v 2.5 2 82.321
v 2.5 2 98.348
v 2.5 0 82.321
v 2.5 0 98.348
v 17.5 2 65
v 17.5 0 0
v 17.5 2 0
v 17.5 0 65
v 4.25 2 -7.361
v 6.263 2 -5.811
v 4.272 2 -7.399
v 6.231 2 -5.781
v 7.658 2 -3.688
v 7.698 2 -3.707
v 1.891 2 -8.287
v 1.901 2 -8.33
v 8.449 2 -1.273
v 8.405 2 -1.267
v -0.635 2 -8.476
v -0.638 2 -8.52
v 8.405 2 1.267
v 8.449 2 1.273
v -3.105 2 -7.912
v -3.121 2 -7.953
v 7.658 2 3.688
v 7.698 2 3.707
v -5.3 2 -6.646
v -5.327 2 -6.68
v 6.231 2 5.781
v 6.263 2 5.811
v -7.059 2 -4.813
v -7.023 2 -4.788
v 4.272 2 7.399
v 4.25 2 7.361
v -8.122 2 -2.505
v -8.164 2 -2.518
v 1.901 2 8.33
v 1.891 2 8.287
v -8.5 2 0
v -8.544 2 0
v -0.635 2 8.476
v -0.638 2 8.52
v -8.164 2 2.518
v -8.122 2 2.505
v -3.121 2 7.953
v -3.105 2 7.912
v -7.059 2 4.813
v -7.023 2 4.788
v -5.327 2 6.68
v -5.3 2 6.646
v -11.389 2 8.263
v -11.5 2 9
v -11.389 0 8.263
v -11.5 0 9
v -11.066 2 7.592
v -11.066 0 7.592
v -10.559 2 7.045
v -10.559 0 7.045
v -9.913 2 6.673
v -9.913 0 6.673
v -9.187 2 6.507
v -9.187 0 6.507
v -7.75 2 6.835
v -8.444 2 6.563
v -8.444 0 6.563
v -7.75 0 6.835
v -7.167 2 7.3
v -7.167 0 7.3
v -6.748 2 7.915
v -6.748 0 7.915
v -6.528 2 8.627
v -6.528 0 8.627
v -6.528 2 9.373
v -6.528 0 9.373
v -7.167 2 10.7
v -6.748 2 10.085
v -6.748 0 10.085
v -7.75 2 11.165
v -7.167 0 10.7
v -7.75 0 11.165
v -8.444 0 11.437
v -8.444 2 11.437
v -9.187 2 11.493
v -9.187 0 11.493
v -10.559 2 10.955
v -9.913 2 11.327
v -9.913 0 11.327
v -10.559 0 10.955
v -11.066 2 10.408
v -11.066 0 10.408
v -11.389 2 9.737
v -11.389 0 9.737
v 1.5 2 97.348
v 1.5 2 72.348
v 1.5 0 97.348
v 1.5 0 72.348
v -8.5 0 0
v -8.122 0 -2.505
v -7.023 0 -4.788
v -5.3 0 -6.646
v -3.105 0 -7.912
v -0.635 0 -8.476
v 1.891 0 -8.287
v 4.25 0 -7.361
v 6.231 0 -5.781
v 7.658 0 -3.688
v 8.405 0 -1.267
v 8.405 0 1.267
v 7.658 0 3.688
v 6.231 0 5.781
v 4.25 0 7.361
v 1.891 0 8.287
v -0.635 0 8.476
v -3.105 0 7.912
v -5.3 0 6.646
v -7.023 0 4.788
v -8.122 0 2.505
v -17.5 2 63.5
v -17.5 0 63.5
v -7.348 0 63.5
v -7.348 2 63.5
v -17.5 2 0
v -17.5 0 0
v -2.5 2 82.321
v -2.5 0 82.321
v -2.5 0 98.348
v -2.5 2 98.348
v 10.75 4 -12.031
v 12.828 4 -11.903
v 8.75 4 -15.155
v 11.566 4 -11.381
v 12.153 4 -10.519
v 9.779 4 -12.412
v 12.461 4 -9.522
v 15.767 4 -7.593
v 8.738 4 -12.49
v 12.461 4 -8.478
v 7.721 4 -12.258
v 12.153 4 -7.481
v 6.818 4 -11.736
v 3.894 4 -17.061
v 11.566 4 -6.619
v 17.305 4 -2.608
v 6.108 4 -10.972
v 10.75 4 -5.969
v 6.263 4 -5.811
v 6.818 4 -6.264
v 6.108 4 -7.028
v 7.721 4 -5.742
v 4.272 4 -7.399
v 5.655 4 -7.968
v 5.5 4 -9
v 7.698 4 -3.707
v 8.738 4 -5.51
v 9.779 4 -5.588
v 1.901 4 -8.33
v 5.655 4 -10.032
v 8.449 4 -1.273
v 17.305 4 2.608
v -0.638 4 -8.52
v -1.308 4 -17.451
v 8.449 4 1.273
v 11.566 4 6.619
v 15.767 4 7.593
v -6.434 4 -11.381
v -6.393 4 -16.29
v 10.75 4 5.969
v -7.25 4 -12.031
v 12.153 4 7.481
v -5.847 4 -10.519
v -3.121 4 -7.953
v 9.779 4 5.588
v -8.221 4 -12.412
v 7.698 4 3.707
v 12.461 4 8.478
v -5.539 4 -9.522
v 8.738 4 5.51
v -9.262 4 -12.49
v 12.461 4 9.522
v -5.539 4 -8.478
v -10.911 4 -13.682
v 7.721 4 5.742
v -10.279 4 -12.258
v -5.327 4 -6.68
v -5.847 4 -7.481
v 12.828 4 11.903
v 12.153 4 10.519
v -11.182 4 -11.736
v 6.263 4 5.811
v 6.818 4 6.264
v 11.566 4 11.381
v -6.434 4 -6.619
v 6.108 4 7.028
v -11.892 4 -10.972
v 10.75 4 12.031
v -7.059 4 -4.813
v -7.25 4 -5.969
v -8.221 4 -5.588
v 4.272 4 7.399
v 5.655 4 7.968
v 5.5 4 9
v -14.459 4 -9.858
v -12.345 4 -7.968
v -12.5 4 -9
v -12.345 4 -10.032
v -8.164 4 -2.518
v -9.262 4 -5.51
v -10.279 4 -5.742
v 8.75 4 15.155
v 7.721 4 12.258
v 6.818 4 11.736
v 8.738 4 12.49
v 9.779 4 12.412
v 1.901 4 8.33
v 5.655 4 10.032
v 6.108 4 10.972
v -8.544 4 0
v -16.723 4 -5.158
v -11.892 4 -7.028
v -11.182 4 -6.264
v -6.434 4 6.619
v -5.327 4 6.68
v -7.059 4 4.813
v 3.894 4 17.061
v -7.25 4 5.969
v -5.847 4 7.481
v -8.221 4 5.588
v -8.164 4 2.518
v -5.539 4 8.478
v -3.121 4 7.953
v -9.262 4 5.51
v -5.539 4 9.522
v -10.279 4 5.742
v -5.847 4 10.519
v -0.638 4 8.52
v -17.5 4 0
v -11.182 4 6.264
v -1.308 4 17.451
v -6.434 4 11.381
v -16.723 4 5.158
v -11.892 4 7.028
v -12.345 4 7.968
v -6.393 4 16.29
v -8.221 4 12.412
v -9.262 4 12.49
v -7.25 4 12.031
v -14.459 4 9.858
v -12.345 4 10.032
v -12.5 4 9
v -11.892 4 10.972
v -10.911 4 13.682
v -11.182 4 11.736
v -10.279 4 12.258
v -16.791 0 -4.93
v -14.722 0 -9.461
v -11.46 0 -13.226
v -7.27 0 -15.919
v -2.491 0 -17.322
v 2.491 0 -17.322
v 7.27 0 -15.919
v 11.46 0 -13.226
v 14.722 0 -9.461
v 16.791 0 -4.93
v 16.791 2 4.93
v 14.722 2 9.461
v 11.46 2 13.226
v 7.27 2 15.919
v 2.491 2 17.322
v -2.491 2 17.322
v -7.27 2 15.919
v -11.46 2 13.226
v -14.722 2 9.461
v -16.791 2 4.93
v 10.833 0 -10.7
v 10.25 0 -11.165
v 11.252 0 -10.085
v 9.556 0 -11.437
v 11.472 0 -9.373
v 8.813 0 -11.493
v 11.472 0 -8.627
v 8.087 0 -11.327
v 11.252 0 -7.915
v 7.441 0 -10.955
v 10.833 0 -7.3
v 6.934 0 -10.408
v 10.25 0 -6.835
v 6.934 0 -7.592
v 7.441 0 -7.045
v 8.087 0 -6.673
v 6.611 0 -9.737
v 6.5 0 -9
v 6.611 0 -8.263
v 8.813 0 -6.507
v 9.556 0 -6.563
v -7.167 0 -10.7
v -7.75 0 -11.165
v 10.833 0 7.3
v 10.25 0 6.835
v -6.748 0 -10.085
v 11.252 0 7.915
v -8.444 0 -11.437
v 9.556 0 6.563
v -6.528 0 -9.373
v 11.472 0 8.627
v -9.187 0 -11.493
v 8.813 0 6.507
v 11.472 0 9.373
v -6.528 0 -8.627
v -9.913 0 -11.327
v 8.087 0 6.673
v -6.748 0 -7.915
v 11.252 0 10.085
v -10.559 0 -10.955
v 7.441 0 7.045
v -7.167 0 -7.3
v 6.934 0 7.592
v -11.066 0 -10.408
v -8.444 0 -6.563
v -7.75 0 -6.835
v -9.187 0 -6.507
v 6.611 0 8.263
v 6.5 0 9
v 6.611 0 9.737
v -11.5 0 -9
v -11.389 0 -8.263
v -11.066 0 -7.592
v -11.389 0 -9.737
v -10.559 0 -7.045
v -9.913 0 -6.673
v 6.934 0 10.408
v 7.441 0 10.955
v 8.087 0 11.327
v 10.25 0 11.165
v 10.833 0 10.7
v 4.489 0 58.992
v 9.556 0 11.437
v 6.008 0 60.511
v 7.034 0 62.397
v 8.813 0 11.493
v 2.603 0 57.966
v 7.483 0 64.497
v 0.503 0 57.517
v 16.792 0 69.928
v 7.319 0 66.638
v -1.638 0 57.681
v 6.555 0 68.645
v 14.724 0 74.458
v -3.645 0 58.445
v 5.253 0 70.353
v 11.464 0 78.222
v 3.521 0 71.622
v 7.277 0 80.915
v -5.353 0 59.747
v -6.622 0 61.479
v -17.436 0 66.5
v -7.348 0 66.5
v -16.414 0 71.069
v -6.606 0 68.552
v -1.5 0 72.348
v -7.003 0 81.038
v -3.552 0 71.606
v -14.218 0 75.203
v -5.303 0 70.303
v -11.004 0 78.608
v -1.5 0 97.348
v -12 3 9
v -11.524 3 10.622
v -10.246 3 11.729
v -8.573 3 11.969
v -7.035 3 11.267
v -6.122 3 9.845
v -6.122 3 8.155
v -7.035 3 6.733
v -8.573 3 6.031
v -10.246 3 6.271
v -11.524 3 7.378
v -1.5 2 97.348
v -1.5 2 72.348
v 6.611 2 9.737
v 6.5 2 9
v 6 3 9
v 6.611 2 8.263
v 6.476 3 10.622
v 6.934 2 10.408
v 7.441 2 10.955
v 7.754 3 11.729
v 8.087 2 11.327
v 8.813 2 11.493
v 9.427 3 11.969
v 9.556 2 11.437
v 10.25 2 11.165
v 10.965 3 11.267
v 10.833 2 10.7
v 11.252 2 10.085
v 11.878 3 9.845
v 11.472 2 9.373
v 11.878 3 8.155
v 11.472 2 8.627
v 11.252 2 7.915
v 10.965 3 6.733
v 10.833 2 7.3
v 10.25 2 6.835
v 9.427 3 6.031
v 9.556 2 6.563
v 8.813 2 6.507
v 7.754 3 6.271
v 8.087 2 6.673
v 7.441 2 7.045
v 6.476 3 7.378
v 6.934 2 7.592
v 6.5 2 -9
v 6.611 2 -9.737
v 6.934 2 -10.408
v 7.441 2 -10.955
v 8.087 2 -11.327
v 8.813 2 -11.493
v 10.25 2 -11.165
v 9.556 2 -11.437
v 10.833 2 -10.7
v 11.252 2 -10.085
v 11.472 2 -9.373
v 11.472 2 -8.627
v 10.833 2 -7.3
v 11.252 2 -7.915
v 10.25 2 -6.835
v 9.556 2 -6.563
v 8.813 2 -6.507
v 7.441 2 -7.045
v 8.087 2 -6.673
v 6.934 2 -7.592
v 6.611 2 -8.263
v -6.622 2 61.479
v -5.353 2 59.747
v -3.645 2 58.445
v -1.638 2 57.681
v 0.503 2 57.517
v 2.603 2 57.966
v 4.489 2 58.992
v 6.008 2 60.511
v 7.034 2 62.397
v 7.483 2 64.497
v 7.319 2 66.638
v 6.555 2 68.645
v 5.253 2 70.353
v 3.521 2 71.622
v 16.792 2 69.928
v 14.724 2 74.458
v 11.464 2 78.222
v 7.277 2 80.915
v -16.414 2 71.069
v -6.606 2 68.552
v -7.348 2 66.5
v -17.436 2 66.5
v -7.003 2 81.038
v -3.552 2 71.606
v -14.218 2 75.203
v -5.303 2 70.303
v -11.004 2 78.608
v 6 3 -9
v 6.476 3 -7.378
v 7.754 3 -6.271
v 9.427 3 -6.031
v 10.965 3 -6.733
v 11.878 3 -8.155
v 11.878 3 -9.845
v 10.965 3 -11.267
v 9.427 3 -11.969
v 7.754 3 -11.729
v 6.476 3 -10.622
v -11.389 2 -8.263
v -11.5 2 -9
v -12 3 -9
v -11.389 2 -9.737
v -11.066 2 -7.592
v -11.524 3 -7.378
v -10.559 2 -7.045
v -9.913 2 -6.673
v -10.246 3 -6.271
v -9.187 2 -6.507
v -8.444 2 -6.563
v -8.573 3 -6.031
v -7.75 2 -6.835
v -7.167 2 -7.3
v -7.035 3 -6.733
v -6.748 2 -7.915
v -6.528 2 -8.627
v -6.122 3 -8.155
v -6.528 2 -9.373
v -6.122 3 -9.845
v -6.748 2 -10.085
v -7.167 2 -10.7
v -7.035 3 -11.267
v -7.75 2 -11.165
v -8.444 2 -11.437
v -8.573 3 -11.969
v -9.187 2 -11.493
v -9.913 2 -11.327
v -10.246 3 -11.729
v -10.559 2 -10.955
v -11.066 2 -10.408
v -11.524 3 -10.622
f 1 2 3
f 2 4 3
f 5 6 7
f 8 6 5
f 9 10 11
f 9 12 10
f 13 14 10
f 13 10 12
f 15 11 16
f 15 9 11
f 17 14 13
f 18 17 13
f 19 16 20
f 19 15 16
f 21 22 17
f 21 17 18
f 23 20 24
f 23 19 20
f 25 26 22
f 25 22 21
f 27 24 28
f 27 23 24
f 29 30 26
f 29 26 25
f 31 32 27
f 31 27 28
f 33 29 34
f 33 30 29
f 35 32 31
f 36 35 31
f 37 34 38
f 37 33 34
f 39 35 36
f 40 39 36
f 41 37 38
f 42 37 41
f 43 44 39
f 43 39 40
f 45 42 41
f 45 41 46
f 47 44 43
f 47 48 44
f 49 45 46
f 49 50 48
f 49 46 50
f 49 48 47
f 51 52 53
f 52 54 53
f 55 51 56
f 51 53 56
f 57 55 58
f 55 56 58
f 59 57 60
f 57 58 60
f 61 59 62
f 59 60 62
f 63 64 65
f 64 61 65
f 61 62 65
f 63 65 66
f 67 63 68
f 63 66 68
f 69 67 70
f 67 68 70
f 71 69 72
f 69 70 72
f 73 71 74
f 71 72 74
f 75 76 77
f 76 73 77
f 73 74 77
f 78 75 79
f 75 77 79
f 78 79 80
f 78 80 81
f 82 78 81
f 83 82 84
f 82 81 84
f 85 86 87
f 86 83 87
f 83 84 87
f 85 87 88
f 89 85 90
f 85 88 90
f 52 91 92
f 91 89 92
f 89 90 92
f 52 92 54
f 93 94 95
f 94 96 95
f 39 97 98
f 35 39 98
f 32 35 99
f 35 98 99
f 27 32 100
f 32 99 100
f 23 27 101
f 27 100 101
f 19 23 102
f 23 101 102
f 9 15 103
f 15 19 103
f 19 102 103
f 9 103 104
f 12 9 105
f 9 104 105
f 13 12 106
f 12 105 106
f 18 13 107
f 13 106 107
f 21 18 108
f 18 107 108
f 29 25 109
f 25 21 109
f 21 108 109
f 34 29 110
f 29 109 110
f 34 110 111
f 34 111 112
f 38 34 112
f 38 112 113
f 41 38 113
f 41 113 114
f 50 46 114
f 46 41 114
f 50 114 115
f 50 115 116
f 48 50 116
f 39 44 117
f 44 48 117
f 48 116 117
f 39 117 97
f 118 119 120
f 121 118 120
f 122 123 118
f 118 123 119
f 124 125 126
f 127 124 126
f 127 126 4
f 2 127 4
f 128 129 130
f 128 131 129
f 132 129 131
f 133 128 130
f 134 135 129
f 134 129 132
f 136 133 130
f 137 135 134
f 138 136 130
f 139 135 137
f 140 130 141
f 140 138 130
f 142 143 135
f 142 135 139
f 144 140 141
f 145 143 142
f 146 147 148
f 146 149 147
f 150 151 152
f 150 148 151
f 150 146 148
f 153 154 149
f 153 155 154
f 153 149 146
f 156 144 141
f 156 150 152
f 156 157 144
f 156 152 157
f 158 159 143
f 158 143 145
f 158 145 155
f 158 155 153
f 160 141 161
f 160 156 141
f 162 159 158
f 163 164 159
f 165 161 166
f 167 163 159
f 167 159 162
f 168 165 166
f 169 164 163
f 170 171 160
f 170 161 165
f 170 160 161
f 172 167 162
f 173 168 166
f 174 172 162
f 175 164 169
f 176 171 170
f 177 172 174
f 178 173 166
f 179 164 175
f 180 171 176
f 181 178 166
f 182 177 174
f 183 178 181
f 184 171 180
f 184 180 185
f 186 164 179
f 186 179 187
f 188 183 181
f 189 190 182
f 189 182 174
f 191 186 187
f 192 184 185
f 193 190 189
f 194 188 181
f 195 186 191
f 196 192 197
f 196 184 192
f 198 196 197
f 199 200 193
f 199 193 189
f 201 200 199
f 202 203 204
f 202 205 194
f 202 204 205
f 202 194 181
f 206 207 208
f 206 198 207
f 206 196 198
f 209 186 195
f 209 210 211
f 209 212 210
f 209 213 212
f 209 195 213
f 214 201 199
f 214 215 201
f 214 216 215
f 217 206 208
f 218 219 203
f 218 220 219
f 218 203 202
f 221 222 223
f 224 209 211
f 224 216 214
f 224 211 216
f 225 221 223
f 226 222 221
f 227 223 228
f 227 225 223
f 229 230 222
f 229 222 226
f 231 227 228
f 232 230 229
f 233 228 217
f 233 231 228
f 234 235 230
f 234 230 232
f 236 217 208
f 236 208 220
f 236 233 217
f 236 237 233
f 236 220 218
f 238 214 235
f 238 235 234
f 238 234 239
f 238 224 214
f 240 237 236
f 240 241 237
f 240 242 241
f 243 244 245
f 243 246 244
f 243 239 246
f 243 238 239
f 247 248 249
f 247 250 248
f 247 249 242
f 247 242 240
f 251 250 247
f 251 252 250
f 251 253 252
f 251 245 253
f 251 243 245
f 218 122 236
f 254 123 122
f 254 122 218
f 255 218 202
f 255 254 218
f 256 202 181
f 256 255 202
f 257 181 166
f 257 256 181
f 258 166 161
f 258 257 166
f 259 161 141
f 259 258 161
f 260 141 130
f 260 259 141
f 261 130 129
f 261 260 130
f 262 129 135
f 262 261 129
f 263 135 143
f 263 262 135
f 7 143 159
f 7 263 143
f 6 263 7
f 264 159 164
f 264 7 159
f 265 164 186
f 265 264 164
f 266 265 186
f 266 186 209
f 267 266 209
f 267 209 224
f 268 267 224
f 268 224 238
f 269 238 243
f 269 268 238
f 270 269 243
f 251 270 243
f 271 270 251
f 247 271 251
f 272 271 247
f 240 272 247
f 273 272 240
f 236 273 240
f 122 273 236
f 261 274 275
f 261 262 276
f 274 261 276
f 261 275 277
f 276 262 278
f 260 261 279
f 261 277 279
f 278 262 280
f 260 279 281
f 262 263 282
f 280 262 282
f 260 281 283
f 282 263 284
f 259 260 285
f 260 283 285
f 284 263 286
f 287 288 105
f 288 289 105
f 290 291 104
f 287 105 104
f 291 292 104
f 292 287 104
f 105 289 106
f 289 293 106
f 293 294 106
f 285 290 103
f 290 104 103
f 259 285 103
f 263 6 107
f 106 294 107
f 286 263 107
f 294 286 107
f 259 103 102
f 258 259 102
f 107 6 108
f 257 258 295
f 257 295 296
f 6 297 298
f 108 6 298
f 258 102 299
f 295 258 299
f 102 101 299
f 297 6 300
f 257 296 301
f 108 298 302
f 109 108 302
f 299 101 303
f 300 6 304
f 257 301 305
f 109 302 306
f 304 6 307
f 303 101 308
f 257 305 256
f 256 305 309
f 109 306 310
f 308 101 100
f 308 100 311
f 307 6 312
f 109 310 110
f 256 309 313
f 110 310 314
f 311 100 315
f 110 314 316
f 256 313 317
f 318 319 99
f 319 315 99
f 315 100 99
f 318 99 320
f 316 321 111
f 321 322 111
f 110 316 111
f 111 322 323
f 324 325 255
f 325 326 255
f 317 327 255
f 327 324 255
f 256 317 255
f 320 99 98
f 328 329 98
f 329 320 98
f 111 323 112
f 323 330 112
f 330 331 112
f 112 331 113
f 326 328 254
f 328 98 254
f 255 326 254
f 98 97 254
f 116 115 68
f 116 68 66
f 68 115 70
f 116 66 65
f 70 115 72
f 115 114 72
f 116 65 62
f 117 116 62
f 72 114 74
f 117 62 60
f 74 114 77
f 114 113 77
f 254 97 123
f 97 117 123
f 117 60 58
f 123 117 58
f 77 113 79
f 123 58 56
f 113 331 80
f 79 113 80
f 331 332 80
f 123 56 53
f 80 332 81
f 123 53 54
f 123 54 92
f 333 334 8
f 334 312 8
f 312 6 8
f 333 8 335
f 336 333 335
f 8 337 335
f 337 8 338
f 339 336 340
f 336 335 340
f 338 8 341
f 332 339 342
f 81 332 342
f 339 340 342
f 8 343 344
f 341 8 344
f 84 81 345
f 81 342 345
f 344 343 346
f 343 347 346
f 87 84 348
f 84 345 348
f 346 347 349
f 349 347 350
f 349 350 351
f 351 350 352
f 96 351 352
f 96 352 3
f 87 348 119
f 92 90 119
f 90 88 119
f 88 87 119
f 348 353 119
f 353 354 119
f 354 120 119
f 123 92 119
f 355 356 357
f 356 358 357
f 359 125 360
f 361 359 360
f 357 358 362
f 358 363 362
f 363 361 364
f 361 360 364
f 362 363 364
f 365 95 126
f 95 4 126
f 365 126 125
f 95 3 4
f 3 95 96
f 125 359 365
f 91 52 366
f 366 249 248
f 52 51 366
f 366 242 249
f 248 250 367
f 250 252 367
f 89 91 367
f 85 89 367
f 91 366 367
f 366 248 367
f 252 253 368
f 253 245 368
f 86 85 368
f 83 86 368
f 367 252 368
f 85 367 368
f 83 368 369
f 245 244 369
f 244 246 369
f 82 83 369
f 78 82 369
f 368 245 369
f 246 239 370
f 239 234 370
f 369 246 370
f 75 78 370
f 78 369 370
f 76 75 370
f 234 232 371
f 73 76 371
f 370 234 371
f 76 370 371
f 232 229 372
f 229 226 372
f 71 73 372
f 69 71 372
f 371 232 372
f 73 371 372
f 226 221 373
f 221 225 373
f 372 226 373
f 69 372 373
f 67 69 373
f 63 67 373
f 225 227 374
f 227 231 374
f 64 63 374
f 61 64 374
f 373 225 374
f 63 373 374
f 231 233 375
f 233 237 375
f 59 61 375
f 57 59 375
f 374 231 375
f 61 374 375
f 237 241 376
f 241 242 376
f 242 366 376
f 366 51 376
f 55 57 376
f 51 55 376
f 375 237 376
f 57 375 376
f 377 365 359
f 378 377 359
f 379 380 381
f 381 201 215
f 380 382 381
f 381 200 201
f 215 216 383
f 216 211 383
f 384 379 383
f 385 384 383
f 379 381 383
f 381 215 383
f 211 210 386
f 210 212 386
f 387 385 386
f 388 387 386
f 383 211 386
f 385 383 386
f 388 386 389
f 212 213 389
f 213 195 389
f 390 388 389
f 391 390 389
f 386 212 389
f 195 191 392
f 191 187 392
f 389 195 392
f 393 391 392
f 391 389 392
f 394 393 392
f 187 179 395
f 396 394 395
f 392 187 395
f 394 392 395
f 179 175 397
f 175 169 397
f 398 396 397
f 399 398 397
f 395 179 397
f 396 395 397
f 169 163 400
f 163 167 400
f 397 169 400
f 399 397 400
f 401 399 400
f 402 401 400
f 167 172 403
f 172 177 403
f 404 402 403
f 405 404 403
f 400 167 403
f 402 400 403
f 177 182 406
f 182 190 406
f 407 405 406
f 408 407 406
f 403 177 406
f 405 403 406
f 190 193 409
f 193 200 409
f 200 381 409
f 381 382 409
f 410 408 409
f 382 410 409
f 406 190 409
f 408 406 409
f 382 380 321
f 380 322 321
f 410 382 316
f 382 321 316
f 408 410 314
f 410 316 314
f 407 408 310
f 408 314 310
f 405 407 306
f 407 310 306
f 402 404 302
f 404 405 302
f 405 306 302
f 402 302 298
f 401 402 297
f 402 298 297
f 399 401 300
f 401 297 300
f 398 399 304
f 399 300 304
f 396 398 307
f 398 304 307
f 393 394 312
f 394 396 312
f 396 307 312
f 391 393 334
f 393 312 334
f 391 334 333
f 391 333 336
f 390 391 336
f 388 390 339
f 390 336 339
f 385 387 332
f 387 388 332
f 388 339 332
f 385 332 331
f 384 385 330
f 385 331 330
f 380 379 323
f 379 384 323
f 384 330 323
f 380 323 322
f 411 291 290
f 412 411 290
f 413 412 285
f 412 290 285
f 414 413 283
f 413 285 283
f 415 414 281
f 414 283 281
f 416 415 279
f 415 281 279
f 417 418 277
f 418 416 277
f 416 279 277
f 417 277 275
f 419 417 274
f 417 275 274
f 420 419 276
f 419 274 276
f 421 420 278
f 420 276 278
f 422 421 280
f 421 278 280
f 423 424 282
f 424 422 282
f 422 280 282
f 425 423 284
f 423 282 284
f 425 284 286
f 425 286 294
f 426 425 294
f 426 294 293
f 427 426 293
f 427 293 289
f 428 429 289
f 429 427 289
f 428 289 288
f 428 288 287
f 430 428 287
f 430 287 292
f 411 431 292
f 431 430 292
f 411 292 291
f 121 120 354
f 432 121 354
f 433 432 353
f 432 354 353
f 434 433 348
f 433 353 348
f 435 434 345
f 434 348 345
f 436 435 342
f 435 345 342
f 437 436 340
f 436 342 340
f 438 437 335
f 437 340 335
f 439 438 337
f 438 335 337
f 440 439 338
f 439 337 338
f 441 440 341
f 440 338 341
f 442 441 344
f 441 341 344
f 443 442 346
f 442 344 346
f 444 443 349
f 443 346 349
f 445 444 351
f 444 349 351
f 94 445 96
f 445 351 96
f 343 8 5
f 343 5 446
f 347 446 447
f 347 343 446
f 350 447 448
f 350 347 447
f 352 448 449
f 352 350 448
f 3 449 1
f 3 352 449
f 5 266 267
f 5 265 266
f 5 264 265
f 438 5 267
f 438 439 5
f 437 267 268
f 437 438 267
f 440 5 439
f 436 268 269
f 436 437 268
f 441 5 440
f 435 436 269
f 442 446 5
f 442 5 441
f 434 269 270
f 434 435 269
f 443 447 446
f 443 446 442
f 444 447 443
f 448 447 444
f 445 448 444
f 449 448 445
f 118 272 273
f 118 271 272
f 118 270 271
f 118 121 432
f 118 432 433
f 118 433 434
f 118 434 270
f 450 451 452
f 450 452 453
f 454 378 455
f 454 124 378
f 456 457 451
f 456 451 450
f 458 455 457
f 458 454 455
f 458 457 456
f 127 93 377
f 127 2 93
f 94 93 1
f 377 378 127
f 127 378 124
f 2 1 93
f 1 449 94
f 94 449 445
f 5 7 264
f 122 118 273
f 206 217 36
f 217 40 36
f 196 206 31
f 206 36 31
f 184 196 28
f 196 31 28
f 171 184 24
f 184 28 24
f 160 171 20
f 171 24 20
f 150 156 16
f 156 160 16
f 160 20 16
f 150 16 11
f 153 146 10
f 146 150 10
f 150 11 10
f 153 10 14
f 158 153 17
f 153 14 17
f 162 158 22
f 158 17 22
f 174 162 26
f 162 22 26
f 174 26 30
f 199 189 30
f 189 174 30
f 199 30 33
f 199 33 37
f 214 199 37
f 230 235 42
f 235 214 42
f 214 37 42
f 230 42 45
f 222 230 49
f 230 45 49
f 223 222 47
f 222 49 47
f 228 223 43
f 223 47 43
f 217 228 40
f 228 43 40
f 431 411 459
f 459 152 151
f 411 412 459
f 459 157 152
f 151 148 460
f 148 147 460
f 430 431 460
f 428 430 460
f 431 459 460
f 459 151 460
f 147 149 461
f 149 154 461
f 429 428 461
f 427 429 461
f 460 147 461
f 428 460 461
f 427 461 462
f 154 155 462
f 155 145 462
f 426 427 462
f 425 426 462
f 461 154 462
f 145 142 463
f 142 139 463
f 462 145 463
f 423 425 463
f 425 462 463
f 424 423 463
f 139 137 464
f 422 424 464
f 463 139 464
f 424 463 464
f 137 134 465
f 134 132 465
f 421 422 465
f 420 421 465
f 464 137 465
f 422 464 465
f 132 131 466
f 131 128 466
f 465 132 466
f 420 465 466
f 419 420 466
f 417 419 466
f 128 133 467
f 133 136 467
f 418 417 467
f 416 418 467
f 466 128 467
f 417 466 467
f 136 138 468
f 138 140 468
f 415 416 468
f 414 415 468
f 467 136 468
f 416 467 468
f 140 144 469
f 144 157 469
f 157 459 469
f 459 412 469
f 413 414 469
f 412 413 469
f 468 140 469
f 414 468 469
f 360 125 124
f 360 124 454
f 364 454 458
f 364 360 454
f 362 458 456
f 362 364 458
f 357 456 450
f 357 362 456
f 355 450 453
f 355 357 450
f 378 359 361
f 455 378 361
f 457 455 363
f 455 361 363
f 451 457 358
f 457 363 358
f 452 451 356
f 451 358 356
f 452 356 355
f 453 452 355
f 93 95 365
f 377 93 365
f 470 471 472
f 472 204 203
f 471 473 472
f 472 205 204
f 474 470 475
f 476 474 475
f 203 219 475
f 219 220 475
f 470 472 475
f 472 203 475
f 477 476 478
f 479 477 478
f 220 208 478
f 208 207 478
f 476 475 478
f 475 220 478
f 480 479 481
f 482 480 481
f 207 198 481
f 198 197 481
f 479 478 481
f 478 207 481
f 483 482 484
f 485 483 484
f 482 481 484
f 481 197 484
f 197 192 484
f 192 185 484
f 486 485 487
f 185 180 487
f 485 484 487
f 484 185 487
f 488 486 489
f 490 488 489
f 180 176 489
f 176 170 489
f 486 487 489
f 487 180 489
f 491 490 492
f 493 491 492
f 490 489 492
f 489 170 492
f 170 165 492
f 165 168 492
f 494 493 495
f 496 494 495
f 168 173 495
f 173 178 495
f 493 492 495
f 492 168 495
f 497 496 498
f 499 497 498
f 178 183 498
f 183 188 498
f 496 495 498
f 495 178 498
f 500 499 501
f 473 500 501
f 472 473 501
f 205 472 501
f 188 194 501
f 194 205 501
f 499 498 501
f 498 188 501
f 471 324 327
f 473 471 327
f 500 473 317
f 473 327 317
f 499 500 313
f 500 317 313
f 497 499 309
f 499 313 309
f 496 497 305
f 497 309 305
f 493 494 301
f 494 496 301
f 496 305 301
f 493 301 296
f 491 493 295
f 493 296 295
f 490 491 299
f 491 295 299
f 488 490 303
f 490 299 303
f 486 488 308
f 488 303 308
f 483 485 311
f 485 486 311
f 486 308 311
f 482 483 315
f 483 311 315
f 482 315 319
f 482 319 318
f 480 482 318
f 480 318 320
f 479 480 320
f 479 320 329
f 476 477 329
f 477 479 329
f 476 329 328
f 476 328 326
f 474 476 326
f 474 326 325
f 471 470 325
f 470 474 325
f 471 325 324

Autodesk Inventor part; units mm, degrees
ref_plane "YZ Plane" through (0, 0, 0) normal (1, 0, 0) x (0, 1, 0)
ref_plane "XZ Plane" through (0, 0, 0) normal (0, 1, 0) x (-1, 0, 0)
ref_plane "XY Plane" through (0, 0, 0) normal (0, 0, 1) x (1, 0, 0)
sketch "Esquisse3" plane through (0, 0, 0) normal (0, 1, 0) x (-1, 0, 0)
  line L0 (-6.5, 6.5) -> (6.5, 6.5) construction
  line L1 (6.5, 6.5) -> (6.5, -6.5) construction
  line L2 (6.5, -6.5) -> (-6.5, -6.5) construction
  line L3 (-6.5, -6.5) -> (-6.5, 6.5) construction
  line L4 (-6.5, 6.5) -> (6.5, -6.5) construction
  line L5 (6.5, 6.5) -> (-6.5, -6.5) construction
  line L6 (-11.5, 11.5) -> (11.5, 11.5) construction
  line L7 (11.5, 11.5) -> (11.5, -11.5) construction
  line L8 (11.5, -11.5) -> (-11.5, -11.5) construction
  line L9 (-11.5, -11.5) -> (-11.5, 11.5) construction
  line L10 (-11.5, 11.5) -> (11.5, -11.5) construction
  line L11 (11.5, 11.5) -> (-11.5, -11.5) construction
  line L12 (-6.5, 6.5) -> (-11.5, 6.5) construction
  line L13 (-11.5, 6.5) -> (-11.5, 11.5) construction
  line L14 (-11.5, 11.5) -> (-6.5, 11.5) construction
  line L15 (-6.5, 11.5) -> (-6.5, 6.5) construction
  line L16 (-6.5, -6.5) -> (-11.5, -6.5) construction
  line L17 (-11.5, -6.5) -> (-11.5, -11.5) construction
  line L18 (-11.5, -11.5) -> (-6.5, -11.5) construction
  line L19 (-6.5, -11.5) -> (-6.5, -6.5) construction
  line L20 (6.5, -6.5) -> (11.5, -6.5) construction
  line L21 (11.5, -6.5) -> (11.5, -11.5) construction
  line L22 (11.5, -11.5) -> (6.5, -11.5) construction
  line L23 (6.5, -11.5) -> (6.5, -6.5) construction
  line L24 (11.5, 11.5) -> (6.5, 11.5) construction
  line L25 (6.5, 11.5) -> (6.5, 6.5) construction
  line L26 (6.5, 6.5) -> (11.5, 6.5) construction
  line L27 (11.5, 6.5) -> (11.5, 11.5) construction
  circle A0 centre (9, 9) radius 2.5
  circle A1 centre (9, -9) radius 2.5
  circle A2 centre (-9, -9) radius 2.5
  circle A3 centre (-9, 9) radius 2.5
  circle A4 centre (0, 0) radius 17.5
  circle A5 centre (0, 0) radius 8.5
  line L28 (17.5, 0) -> (17.5, 65)
  line L29 (-17.5, 0) -> (-17.5, 65)
  line L30 (0, -17.5) -> (0, 82.5) construction
  circle A6 centre (0, 65) radius 17.5
  circle A7 centre (0, 65) radius 7.5
  line L31 (1.5, 72.3485) -> (-1.5, 72.3485)
  line L32 (-1.5, 72.3485) -> (-1.5, 97.3485)
  line L33 (-1.5, 97.3485) -> (1.5, 97.3485)
  line L34 (1.5, 97.3485) -> (1.5, 72.3485)
  line L35 (-2.5, 98.3485) -> (-2.5, 71.3485)
  line L36 (-2.5, 71.3485) -> (2.5, 71.3485)
  line L37 (2.5, 71.3485) -> (2.5, 98.3485)
  line L38 (2.5, 98.3485) -> (-2.5, 98.3485)
  line L39 (17.5, 63.5) -> (7.3485, 63.5)
  line L40 (7.3485, 63.5) -> (7.3485, 66.5)
  line L41 (7.3485, 66.5) -> (17.5, 66.5)
  line L42 (17.5, 66.5) -> (17.5, 63.5)
  point P0 (17.4356, 66.5)
  point P1 (2.5, 82.3205)
  point P2 (-2.5, 82.3205)
  dimension "d1" = 13
  dimension "d2" = 13
  dimension "d3" = 5
  dimension "d4" = 35
  dimension "d9" = 9
  dimension "d29" = 100
  dimension "d31" = 35
  dimension "d32" = 15
  dimension "d33" = 3
  dimension "d34" = 25
  dimension "d36" = 1
  dimension "d37" = 3
extrude "Extrusion1" add sketch "Esquisse3" along normal blind 2 contours A4 | A4 L29 A6 L39 L28 | A6 L35 A7 L39 | L35 L38 L37 A6 L34 L33 L32 | A6 L32 A7 L35 | L41 A7 L37 A6 | L37 A7 L34 A6
sketch "Esquisse4" plane through (0, 2, 0) normal (0, 1, 0) x (-1, 0, 0)
  circle A0 centre (9, -9) radius 3.5
  circle A1 centre (9, -9) radius 2.5 projected
  circle A2 centre (-9, -9) radius 3.5
  circle A3 centre (-9, 9) radius 3.5
  circle A4 centre (9, 9) radius 3.5
  circle A5 centre (-9, -9) radius 2.5 projected
  circle A6 centre (-9, 9) radius 2.5 projected
  circle A7 centre (9, 9) radius 2.5 projected
  circle A8 centre (0, 0) radius 17.5
  circle A9 centre (0, 0) radius 8.544
  circle A10 centre (-9, -9) radius 2.5 projected
  circle A11 centre (-9, -9) radius 2.5
  circle A12 centre (-9, 9) radius 2.5
  circle A13 centre (9, 9) radius 2.5
  dimension "d10" = 7
  dimension "d11" = 7
  dimension "d12" = 7
  dimension "d13" = 7
extrude "Extrusion2" add sketch "Esquisse4" along normal blind 2 contours A0 | A2 | A3 | A4 | A8
chamfer "Chanfrein1" distance 1 distance2 2 1 edges at (-6.5, 4, -9) measured on face at (-3.3085, 4, -12.0053)
chamfer "Chanfrein2" distance 1 distance2 2 1 edges at (11.5, 4, -9) measured on face at (3.3085, 4, 12.0053)
chamfer "Chanfrein3" distance 1 distance2 2 1 edges at (-6.5, 4, 9) measured on face at (3.3085, 4, 12.0053)
chamfer "Chanfrein4" distance 1 distance2 2 1 edges at (11.5, 4, 9) measured on face at (3.3085, 4, 12.0053)
sketch "Esquisse7" plane through (0, 2, 0) normal (0, 1, 0) x (1, 0, 0)
  point P0 (0, 0)
properties part number "Pièce_moteur_maintient_test_3"
